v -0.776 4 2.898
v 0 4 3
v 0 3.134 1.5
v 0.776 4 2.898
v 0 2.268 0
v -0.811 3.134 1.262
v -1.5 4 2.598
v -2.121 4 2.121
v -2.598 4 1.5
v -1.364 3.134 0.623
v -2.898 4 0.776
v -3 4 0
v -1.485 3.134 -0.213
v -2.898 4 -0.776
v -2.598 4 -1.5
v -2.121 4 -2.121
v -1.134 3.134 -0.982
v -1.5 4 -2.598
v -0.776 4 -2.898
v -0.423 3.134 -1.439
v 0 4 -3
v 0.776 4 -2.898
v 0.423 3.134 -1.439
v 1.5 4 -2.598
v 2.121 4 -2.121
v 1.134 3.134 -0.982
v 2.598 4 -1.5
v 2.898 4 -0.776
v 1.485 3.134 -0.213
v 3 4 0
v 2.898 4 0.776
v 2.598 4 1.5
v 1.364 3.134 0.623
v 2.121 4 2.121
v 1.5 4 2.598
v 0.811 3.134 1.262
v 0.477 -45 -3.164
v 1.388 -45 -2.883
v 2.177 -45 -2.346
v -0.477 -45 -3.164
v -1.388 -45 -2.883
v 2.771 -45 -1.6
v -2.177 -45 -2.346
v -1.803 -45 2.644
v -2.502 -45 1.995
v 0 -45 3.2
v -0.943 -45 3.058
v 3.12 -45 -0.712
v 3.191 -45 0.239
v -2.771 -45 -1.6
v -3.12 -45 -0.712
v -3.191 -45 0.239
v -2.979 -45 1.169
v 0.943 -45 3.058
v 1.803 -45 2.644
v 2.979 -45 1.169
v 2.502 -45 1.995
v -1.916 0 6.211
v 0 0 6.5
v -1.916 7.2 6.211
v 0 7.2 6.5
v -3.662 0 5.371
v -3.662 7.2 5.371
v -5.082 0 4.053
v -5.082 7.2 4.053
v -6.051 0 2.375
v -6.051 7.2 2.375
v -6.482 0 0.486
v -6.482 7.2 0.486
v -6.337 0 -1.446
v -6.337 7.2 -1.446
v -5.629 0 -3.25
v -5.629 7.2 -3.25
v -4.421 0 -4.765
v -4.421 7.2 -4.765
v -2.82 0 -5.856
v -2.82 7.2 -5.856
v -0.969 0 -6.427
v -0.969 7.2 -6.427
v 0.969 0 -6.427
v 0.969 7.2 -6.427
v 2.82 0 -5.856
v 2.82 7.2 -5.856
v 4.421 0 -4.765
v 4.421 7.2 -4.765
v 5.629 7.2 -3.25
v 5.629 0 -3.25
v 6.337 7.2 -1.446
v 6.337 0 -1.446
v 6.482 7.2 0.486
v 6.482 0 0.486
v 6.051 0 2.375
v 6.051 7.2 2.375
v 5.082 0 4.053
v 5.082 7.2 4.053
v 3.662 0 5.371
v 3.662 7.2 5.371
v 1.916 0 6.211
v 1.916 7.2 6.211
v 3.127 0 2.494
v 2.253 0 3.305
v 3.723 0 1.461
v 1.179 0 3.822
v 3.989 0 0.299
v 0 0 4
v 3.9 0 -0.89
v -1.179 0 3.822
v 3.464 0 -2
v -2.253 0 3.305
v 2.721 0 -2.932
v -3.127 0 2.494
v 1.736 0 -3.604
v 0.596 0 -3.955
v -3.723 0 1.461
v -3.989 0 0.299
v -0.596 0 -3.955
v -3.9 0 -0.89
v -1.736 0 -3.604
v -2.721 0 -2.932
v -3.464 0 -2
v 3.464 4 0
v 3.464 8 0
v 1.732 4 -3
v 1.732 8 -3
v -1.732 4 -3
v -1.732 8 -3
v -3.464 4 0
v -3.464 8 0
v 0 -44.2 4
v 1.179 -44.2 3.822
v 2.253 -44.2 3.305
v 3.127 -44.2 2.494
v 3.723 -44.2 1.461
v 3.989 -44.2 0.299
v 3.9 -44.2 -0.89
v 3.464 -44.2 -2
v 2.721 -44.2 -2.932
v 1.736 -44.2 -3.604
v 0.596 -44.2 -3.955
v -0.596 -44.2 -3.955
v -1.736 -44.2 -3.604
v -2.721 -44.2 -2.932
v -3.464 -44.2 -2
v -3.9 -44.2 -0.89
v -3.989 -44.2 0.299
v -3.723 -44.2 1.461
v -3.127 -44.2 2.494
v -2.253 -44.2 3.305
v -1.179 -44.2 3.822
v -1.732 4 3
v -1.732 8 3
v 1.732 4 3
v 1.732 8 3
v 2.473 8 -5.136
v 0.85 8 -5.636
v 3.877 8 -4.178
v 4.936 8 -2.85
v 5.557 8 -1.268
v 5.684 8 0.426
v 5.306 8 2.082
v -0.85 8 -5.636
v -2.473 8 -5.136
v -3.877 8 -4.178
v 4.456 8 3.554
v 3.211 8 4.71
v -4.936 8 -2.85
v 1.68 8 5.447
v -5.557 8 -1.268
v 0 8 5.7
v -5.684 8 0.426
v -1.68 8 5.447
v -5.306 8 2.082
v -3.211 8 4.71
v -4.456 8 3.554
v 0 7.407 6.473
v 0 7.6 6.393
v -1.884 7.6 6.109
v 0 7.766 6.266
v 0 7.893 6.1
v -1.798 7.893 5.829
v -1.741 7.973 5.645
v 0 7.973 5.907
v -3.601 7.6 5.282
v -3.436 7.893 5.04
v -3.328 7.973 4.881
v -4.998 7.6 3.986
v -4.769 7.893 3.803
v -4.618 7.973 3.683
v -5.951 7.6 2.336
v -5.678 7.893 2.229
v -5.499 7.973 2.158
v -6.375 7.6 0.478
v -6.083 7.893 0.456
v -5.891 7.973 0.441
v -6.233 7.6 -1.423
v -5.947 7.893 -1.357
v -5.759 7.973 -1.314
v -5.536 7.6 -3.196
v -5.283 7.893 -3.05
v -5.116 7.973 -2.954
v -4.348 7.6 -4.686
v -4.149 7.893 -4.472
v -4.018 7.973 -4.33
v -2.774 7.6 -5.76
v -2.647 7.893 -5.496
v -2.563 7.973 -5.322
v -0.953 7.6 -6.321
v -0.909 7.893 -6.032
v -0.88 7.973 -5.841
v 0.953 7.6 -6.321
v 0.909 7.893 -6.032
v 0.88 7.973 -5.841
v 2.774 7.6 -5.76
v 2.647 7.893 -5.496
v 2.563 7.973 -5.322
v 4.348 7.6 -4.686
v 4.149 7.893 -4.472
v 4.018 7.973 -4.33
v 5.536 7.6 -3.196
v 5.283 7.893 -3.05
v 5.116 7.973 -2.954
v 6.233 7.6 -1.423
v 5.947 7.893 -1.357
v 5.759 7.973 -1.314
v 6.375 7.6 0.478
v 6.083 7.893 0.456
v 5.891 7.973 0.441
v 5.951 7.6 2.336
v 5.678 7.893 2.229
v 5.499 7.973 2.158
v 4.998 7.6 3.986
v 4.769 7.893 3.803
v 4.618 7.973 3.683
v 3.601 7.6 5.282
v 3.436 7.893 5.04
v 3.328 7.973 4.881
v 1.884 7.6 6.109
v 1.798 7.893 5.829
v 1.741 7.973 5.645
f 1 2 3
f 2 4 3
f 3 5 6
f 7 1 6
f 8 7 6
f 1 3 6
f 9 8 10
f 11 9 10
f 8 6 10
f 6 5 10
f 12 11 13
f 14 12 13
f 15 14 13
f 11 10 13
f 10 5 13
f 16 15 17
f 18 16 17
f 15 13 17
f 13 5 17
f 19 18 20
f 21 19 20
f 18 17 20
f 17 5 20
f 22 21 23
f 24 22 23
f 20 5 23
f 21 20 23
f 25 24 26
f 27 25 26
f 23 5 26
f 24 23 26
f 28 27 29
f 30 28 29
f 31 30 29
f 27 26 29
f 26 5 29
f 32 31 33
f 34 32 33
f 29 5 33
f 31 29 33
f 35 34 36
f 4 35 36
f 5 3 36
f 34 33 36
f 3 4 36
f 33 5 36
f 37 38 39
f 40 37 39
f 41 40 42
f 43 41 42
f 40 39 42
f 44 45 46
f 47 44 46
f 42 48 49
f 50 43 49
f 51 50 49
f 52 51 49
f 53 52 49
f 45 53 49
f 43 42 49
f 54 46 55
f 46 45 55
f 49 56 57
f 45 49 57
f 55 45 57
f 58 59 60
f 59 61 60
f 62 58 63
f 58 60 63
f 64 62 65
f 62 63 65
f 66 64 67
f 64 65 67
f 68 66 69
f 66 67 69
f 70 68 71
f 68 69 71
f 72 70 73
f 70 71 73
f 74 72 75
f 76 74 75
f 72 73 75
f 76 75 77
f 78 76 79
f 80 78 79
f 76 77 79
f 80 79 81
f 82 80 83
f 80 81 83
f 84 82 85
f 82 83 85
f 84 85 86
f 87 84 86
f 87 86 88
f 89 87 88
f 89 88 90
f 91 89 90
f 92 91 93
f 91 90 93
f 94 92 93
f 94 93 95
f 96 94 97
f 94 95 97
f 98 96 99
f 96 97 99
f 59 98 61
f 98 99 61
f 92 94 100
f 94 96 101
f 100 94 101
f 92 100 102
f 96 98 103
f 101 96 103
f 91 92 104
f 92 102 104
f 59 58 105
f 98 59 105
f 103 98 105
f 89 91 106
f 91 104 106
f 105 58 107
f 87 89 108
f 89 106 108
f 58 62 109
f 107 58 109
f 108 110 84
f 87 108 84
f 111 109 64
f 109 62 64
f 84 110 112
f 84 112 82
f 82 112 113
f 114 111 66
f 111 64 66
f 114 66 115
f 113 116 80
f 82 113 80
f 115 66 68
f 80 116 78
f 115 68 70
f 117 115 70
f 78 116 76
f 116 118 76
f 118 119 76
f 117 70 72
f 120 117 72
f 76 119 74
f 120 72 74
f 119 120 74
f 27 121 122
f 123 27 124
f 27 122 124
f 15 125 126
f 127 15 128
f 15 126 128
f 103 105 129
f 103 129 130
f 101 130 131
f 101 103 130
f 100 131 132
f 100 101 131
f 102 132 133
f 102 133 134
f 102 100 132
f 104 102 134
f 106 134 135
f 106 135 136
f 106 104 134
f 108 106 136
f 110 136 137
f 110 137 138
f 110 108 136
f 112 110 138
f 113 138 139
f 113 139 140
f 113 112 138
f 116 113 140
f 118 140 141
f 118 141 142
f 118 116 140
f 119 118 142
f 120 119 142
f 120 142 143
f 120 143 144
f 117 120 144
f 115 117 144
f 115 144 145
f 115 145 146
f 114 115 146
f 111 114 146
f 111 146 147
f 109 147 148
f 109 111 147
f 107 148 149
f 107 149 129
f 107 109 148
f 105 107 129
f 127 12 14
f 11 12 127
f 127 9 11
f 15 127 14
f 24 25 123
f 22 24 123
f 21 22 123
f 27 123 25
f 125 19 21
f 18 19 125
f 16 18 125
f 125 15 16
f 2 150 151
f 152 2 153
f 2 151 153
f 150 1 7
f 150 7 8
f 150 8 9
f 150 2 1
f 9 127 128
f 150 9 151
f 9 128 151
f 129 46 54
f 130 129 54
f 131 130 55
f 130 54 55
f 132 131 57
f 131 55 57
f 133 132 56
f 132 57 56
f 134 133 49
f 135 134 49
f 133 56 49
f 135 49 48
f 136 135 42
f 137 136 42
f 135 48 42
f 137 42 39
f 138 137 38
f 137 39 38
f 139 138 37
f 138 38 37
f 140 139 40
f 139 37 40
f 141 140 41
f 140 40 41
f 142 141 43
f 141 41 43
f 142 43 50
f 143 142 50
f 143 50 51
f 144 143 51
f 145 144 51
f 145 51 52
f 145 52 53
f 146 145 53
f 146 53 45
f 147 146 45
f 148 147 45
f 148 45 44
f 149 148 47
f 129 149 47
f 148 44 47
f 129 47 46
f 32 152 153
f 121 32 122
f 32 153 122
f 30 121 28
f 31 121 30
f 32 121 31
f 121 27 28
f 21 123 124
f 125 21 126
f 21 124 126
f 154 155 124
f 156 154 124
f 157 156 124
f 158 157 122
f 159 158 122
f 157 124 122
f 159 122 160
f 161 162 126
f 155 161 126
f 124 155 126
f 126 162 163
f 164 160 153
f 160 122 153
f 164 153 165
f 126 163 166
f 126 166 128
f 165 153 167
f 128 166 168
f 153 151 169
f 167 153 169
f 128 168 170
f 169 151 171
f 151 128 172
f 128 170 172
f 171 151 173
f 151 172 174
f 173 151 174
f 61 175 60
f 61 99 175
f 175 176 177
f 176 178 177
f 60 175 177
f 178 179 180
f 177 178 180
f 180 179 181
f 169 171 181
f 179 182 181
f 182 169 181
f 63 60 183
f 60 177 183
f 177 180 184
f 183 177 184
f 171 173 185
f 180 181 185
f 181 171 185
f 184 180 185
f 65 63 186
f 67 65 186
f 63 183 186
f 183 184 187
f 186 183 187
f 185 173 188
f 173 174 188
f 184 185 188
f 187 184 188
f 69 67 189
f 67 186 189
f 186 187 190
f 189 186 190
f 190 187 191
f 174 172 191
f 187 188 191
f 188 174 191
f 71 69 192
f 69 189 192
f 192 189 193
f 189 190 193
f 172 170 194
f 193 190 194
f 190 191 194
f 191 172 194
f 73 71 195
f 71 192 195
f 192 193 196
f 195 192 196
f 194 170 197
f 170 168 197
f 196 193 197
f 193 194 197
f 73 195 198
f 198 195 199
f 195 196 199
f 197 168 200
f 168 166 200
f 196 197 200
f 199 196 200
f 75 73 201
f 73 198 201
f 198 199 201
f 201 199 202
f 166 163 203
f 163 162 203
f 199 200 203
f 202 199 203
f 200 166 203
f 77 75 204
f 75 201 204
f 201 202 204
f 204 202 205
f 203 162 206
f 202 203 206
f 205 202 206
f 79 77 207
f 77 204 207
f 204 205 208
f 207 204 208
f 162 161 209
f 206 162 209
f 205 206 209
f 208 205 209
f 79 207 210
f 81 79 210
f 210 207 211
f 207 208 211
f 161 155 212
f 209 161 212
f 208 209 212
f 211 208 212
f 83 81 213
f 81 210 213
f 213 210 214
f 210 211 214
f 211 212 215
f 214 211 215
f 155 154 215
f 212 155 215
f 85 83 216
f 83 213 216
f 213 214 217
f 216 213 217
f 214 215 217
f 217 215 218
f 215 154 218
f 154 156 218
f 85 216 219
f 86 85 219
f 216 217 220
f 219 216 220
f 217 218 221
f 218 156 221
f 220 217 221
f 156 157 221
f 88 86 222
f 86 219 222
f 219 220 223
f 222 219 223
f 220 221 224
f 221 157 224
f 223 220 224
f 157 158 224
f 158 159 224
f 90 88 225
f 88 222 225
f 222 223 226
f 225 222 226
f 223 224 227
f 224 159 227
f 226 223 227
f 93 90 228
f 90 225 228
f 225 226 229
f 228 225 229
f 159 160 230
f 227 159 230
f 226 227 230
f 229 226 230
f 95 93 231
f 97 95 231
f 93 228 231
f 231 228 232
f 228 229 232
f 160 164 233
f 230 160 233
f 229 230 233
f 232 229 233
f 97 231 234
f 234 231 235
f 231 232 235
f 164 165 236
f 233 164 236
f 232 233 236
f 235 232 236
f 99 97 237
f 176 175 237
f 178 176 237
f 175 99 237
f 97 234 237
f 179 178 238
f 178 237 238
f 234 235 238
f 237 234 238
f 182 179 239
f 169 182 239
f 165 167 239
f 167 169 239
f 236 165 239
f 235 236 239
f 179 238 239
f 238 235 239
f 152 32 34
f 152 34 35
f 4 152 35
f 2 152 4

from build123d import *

# Parameters (mm, degrees)
ESQUISSE2_R             = 4
BASE_EXTRUSION_DEPTH    = 45
CHANFREIN1_SIZE         = 0.8
ENL_V_MAT_EXTRU_1_DEPTH = 4


with BuildPart() as part:
    # Esquisse2 → Base-Extrusion (new body)
    with BuildSketch(Plane(origin=(0, 0, 0), x_dir=(1, 0, 0), z_dir=(0, 1, 0))):
        with Locations(Location((0, 0, 0), (0, 0, 270))):  # turned: the seam where the file's is
            Circle(ESQUISSE2_R)
    extrude(amount=-BASE_EXTRUSION_DEPTH)

    # Chanfrein1
    chanfrein1_edges = [part.edges().sort_by_distance(p)[0] for p in [
        (0, -45, -4),
    ]]
    chamfer(chanfrein1_edges, length=CHANFREIN1_SIZE)

    # Esquisse5 → Boss.-Révol.1 (revolve)
    with BuildSketch(Plane.XY, mode=Mode.PRIVATE) as boss_r_vol_1_sk:
        with BuildLine():
            Line((3, 8), (3, 4))
            Line((3, 4), (0, 2.267949192))
            Line((0, 2.267949192), (0, 0))
            Line((0, 0), (6.5, 0))
            Line((6.5, 0), (6.5, 7.2))
            ThreePointArc((6.5, 7.2), (6.265685425, 7.765685425), (5.7, 8))
            Line((5.7, 8), (3, 8))
        make_face()
    revolve(boss_r_vol_1_sk.sketch.rotate(Axis((0, 8, 0), (0, -1, 0)), 90), axis=Axis((0, 8, 0), (0, -1, 0)))  # turned: the seam where the file's is

    # Esquisse7 → Enlèv. mat.-Extru.1 (cut)
    with BuildSketch(Plane(origin=(0, 8, 0), x_dir=(-1, 0, 0), z_dir=(0, 1, 0))):
        Polygon((1.732050808, 3), (-1.732050808, 3), (-3.464101615, 0), (-1.732050808, -3), (1.732050808, -3), (3.464101615, 0), align=None)
    extrude(amount=-ENL_V_MAT_EXTRU_1_DEPTH, mode=Mode.SUBTRACT)


solid = part.part
